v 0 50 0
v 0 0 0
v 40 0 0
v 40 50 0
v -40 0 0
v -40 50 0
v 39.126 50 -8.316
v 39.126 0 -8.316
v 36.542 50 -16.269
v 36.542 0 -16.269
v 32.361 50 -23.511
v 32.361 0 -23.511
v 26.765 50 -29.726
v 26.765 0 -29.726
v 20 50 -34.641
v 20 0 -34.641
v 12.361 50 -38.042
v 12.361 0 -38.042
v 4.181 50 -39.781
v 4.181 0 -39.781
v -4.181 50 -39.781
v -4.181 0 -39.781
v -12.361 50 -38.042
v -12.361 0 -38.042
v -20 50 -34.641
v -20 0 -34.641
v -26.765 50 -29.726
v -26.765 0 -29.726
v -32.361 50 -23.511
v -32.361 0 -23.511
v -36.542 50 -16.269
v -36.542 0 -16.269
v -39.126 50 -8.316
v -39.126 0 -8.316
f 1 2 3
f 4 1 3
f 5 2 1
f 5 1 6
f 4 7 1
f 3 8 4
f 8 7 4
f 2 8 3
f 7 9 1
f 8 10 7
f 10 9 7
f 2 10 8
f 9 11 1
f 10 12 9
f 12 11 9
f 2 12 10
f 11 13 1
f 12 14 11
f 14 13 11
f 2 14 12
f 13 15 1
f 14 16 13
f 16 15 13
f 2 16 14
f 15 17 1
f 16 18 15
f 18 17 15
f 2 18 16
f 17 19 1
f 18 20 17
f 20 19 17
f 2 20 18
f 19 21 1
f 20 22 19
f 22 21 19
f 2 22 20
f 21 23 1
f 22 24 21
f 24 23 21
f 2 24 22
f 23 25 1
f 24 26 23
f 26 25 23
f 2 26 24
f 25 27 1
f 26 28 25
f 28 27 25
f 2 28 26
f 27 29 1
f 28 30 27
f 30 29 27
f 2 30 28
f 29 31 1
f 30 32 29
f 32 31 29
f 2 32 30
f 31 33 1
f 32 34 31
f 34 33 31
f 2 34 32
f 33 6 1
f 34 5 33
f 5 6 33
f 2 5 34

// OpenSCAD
handleDiameter = 12;

combinationLower();

//leftCluster();

//combinationCombined();

module combinationCombined() {
    color("red") combinationLower();

    //color("blue") combinationUpper();
}


module combinationLower(width=50) {
    
    diameter=80;
        rotate([-90, 0, 0]) {
            rotate_extrude(angle=180) {            
                    square([diameter/2, width]);
        }
    }
}

module combinationUpper() {
}



module leftCluster() {
    handle();
    grip();
}

module handle() { 
    color("silver")
    translate([-50,0,0])
    rotate([0,90,0]) {
        cylinder(h=100, d=handleDiameter);
    }
}
module grip(length=100) {
    
    color("grey")
    rotate([0,90,0])
    difference() {
        union() {
            cylinder(h=length, d = 20);
            cylinder(h=5, d = 25);
        }
        
        cylinder(h=length, d=12);
    }
}
